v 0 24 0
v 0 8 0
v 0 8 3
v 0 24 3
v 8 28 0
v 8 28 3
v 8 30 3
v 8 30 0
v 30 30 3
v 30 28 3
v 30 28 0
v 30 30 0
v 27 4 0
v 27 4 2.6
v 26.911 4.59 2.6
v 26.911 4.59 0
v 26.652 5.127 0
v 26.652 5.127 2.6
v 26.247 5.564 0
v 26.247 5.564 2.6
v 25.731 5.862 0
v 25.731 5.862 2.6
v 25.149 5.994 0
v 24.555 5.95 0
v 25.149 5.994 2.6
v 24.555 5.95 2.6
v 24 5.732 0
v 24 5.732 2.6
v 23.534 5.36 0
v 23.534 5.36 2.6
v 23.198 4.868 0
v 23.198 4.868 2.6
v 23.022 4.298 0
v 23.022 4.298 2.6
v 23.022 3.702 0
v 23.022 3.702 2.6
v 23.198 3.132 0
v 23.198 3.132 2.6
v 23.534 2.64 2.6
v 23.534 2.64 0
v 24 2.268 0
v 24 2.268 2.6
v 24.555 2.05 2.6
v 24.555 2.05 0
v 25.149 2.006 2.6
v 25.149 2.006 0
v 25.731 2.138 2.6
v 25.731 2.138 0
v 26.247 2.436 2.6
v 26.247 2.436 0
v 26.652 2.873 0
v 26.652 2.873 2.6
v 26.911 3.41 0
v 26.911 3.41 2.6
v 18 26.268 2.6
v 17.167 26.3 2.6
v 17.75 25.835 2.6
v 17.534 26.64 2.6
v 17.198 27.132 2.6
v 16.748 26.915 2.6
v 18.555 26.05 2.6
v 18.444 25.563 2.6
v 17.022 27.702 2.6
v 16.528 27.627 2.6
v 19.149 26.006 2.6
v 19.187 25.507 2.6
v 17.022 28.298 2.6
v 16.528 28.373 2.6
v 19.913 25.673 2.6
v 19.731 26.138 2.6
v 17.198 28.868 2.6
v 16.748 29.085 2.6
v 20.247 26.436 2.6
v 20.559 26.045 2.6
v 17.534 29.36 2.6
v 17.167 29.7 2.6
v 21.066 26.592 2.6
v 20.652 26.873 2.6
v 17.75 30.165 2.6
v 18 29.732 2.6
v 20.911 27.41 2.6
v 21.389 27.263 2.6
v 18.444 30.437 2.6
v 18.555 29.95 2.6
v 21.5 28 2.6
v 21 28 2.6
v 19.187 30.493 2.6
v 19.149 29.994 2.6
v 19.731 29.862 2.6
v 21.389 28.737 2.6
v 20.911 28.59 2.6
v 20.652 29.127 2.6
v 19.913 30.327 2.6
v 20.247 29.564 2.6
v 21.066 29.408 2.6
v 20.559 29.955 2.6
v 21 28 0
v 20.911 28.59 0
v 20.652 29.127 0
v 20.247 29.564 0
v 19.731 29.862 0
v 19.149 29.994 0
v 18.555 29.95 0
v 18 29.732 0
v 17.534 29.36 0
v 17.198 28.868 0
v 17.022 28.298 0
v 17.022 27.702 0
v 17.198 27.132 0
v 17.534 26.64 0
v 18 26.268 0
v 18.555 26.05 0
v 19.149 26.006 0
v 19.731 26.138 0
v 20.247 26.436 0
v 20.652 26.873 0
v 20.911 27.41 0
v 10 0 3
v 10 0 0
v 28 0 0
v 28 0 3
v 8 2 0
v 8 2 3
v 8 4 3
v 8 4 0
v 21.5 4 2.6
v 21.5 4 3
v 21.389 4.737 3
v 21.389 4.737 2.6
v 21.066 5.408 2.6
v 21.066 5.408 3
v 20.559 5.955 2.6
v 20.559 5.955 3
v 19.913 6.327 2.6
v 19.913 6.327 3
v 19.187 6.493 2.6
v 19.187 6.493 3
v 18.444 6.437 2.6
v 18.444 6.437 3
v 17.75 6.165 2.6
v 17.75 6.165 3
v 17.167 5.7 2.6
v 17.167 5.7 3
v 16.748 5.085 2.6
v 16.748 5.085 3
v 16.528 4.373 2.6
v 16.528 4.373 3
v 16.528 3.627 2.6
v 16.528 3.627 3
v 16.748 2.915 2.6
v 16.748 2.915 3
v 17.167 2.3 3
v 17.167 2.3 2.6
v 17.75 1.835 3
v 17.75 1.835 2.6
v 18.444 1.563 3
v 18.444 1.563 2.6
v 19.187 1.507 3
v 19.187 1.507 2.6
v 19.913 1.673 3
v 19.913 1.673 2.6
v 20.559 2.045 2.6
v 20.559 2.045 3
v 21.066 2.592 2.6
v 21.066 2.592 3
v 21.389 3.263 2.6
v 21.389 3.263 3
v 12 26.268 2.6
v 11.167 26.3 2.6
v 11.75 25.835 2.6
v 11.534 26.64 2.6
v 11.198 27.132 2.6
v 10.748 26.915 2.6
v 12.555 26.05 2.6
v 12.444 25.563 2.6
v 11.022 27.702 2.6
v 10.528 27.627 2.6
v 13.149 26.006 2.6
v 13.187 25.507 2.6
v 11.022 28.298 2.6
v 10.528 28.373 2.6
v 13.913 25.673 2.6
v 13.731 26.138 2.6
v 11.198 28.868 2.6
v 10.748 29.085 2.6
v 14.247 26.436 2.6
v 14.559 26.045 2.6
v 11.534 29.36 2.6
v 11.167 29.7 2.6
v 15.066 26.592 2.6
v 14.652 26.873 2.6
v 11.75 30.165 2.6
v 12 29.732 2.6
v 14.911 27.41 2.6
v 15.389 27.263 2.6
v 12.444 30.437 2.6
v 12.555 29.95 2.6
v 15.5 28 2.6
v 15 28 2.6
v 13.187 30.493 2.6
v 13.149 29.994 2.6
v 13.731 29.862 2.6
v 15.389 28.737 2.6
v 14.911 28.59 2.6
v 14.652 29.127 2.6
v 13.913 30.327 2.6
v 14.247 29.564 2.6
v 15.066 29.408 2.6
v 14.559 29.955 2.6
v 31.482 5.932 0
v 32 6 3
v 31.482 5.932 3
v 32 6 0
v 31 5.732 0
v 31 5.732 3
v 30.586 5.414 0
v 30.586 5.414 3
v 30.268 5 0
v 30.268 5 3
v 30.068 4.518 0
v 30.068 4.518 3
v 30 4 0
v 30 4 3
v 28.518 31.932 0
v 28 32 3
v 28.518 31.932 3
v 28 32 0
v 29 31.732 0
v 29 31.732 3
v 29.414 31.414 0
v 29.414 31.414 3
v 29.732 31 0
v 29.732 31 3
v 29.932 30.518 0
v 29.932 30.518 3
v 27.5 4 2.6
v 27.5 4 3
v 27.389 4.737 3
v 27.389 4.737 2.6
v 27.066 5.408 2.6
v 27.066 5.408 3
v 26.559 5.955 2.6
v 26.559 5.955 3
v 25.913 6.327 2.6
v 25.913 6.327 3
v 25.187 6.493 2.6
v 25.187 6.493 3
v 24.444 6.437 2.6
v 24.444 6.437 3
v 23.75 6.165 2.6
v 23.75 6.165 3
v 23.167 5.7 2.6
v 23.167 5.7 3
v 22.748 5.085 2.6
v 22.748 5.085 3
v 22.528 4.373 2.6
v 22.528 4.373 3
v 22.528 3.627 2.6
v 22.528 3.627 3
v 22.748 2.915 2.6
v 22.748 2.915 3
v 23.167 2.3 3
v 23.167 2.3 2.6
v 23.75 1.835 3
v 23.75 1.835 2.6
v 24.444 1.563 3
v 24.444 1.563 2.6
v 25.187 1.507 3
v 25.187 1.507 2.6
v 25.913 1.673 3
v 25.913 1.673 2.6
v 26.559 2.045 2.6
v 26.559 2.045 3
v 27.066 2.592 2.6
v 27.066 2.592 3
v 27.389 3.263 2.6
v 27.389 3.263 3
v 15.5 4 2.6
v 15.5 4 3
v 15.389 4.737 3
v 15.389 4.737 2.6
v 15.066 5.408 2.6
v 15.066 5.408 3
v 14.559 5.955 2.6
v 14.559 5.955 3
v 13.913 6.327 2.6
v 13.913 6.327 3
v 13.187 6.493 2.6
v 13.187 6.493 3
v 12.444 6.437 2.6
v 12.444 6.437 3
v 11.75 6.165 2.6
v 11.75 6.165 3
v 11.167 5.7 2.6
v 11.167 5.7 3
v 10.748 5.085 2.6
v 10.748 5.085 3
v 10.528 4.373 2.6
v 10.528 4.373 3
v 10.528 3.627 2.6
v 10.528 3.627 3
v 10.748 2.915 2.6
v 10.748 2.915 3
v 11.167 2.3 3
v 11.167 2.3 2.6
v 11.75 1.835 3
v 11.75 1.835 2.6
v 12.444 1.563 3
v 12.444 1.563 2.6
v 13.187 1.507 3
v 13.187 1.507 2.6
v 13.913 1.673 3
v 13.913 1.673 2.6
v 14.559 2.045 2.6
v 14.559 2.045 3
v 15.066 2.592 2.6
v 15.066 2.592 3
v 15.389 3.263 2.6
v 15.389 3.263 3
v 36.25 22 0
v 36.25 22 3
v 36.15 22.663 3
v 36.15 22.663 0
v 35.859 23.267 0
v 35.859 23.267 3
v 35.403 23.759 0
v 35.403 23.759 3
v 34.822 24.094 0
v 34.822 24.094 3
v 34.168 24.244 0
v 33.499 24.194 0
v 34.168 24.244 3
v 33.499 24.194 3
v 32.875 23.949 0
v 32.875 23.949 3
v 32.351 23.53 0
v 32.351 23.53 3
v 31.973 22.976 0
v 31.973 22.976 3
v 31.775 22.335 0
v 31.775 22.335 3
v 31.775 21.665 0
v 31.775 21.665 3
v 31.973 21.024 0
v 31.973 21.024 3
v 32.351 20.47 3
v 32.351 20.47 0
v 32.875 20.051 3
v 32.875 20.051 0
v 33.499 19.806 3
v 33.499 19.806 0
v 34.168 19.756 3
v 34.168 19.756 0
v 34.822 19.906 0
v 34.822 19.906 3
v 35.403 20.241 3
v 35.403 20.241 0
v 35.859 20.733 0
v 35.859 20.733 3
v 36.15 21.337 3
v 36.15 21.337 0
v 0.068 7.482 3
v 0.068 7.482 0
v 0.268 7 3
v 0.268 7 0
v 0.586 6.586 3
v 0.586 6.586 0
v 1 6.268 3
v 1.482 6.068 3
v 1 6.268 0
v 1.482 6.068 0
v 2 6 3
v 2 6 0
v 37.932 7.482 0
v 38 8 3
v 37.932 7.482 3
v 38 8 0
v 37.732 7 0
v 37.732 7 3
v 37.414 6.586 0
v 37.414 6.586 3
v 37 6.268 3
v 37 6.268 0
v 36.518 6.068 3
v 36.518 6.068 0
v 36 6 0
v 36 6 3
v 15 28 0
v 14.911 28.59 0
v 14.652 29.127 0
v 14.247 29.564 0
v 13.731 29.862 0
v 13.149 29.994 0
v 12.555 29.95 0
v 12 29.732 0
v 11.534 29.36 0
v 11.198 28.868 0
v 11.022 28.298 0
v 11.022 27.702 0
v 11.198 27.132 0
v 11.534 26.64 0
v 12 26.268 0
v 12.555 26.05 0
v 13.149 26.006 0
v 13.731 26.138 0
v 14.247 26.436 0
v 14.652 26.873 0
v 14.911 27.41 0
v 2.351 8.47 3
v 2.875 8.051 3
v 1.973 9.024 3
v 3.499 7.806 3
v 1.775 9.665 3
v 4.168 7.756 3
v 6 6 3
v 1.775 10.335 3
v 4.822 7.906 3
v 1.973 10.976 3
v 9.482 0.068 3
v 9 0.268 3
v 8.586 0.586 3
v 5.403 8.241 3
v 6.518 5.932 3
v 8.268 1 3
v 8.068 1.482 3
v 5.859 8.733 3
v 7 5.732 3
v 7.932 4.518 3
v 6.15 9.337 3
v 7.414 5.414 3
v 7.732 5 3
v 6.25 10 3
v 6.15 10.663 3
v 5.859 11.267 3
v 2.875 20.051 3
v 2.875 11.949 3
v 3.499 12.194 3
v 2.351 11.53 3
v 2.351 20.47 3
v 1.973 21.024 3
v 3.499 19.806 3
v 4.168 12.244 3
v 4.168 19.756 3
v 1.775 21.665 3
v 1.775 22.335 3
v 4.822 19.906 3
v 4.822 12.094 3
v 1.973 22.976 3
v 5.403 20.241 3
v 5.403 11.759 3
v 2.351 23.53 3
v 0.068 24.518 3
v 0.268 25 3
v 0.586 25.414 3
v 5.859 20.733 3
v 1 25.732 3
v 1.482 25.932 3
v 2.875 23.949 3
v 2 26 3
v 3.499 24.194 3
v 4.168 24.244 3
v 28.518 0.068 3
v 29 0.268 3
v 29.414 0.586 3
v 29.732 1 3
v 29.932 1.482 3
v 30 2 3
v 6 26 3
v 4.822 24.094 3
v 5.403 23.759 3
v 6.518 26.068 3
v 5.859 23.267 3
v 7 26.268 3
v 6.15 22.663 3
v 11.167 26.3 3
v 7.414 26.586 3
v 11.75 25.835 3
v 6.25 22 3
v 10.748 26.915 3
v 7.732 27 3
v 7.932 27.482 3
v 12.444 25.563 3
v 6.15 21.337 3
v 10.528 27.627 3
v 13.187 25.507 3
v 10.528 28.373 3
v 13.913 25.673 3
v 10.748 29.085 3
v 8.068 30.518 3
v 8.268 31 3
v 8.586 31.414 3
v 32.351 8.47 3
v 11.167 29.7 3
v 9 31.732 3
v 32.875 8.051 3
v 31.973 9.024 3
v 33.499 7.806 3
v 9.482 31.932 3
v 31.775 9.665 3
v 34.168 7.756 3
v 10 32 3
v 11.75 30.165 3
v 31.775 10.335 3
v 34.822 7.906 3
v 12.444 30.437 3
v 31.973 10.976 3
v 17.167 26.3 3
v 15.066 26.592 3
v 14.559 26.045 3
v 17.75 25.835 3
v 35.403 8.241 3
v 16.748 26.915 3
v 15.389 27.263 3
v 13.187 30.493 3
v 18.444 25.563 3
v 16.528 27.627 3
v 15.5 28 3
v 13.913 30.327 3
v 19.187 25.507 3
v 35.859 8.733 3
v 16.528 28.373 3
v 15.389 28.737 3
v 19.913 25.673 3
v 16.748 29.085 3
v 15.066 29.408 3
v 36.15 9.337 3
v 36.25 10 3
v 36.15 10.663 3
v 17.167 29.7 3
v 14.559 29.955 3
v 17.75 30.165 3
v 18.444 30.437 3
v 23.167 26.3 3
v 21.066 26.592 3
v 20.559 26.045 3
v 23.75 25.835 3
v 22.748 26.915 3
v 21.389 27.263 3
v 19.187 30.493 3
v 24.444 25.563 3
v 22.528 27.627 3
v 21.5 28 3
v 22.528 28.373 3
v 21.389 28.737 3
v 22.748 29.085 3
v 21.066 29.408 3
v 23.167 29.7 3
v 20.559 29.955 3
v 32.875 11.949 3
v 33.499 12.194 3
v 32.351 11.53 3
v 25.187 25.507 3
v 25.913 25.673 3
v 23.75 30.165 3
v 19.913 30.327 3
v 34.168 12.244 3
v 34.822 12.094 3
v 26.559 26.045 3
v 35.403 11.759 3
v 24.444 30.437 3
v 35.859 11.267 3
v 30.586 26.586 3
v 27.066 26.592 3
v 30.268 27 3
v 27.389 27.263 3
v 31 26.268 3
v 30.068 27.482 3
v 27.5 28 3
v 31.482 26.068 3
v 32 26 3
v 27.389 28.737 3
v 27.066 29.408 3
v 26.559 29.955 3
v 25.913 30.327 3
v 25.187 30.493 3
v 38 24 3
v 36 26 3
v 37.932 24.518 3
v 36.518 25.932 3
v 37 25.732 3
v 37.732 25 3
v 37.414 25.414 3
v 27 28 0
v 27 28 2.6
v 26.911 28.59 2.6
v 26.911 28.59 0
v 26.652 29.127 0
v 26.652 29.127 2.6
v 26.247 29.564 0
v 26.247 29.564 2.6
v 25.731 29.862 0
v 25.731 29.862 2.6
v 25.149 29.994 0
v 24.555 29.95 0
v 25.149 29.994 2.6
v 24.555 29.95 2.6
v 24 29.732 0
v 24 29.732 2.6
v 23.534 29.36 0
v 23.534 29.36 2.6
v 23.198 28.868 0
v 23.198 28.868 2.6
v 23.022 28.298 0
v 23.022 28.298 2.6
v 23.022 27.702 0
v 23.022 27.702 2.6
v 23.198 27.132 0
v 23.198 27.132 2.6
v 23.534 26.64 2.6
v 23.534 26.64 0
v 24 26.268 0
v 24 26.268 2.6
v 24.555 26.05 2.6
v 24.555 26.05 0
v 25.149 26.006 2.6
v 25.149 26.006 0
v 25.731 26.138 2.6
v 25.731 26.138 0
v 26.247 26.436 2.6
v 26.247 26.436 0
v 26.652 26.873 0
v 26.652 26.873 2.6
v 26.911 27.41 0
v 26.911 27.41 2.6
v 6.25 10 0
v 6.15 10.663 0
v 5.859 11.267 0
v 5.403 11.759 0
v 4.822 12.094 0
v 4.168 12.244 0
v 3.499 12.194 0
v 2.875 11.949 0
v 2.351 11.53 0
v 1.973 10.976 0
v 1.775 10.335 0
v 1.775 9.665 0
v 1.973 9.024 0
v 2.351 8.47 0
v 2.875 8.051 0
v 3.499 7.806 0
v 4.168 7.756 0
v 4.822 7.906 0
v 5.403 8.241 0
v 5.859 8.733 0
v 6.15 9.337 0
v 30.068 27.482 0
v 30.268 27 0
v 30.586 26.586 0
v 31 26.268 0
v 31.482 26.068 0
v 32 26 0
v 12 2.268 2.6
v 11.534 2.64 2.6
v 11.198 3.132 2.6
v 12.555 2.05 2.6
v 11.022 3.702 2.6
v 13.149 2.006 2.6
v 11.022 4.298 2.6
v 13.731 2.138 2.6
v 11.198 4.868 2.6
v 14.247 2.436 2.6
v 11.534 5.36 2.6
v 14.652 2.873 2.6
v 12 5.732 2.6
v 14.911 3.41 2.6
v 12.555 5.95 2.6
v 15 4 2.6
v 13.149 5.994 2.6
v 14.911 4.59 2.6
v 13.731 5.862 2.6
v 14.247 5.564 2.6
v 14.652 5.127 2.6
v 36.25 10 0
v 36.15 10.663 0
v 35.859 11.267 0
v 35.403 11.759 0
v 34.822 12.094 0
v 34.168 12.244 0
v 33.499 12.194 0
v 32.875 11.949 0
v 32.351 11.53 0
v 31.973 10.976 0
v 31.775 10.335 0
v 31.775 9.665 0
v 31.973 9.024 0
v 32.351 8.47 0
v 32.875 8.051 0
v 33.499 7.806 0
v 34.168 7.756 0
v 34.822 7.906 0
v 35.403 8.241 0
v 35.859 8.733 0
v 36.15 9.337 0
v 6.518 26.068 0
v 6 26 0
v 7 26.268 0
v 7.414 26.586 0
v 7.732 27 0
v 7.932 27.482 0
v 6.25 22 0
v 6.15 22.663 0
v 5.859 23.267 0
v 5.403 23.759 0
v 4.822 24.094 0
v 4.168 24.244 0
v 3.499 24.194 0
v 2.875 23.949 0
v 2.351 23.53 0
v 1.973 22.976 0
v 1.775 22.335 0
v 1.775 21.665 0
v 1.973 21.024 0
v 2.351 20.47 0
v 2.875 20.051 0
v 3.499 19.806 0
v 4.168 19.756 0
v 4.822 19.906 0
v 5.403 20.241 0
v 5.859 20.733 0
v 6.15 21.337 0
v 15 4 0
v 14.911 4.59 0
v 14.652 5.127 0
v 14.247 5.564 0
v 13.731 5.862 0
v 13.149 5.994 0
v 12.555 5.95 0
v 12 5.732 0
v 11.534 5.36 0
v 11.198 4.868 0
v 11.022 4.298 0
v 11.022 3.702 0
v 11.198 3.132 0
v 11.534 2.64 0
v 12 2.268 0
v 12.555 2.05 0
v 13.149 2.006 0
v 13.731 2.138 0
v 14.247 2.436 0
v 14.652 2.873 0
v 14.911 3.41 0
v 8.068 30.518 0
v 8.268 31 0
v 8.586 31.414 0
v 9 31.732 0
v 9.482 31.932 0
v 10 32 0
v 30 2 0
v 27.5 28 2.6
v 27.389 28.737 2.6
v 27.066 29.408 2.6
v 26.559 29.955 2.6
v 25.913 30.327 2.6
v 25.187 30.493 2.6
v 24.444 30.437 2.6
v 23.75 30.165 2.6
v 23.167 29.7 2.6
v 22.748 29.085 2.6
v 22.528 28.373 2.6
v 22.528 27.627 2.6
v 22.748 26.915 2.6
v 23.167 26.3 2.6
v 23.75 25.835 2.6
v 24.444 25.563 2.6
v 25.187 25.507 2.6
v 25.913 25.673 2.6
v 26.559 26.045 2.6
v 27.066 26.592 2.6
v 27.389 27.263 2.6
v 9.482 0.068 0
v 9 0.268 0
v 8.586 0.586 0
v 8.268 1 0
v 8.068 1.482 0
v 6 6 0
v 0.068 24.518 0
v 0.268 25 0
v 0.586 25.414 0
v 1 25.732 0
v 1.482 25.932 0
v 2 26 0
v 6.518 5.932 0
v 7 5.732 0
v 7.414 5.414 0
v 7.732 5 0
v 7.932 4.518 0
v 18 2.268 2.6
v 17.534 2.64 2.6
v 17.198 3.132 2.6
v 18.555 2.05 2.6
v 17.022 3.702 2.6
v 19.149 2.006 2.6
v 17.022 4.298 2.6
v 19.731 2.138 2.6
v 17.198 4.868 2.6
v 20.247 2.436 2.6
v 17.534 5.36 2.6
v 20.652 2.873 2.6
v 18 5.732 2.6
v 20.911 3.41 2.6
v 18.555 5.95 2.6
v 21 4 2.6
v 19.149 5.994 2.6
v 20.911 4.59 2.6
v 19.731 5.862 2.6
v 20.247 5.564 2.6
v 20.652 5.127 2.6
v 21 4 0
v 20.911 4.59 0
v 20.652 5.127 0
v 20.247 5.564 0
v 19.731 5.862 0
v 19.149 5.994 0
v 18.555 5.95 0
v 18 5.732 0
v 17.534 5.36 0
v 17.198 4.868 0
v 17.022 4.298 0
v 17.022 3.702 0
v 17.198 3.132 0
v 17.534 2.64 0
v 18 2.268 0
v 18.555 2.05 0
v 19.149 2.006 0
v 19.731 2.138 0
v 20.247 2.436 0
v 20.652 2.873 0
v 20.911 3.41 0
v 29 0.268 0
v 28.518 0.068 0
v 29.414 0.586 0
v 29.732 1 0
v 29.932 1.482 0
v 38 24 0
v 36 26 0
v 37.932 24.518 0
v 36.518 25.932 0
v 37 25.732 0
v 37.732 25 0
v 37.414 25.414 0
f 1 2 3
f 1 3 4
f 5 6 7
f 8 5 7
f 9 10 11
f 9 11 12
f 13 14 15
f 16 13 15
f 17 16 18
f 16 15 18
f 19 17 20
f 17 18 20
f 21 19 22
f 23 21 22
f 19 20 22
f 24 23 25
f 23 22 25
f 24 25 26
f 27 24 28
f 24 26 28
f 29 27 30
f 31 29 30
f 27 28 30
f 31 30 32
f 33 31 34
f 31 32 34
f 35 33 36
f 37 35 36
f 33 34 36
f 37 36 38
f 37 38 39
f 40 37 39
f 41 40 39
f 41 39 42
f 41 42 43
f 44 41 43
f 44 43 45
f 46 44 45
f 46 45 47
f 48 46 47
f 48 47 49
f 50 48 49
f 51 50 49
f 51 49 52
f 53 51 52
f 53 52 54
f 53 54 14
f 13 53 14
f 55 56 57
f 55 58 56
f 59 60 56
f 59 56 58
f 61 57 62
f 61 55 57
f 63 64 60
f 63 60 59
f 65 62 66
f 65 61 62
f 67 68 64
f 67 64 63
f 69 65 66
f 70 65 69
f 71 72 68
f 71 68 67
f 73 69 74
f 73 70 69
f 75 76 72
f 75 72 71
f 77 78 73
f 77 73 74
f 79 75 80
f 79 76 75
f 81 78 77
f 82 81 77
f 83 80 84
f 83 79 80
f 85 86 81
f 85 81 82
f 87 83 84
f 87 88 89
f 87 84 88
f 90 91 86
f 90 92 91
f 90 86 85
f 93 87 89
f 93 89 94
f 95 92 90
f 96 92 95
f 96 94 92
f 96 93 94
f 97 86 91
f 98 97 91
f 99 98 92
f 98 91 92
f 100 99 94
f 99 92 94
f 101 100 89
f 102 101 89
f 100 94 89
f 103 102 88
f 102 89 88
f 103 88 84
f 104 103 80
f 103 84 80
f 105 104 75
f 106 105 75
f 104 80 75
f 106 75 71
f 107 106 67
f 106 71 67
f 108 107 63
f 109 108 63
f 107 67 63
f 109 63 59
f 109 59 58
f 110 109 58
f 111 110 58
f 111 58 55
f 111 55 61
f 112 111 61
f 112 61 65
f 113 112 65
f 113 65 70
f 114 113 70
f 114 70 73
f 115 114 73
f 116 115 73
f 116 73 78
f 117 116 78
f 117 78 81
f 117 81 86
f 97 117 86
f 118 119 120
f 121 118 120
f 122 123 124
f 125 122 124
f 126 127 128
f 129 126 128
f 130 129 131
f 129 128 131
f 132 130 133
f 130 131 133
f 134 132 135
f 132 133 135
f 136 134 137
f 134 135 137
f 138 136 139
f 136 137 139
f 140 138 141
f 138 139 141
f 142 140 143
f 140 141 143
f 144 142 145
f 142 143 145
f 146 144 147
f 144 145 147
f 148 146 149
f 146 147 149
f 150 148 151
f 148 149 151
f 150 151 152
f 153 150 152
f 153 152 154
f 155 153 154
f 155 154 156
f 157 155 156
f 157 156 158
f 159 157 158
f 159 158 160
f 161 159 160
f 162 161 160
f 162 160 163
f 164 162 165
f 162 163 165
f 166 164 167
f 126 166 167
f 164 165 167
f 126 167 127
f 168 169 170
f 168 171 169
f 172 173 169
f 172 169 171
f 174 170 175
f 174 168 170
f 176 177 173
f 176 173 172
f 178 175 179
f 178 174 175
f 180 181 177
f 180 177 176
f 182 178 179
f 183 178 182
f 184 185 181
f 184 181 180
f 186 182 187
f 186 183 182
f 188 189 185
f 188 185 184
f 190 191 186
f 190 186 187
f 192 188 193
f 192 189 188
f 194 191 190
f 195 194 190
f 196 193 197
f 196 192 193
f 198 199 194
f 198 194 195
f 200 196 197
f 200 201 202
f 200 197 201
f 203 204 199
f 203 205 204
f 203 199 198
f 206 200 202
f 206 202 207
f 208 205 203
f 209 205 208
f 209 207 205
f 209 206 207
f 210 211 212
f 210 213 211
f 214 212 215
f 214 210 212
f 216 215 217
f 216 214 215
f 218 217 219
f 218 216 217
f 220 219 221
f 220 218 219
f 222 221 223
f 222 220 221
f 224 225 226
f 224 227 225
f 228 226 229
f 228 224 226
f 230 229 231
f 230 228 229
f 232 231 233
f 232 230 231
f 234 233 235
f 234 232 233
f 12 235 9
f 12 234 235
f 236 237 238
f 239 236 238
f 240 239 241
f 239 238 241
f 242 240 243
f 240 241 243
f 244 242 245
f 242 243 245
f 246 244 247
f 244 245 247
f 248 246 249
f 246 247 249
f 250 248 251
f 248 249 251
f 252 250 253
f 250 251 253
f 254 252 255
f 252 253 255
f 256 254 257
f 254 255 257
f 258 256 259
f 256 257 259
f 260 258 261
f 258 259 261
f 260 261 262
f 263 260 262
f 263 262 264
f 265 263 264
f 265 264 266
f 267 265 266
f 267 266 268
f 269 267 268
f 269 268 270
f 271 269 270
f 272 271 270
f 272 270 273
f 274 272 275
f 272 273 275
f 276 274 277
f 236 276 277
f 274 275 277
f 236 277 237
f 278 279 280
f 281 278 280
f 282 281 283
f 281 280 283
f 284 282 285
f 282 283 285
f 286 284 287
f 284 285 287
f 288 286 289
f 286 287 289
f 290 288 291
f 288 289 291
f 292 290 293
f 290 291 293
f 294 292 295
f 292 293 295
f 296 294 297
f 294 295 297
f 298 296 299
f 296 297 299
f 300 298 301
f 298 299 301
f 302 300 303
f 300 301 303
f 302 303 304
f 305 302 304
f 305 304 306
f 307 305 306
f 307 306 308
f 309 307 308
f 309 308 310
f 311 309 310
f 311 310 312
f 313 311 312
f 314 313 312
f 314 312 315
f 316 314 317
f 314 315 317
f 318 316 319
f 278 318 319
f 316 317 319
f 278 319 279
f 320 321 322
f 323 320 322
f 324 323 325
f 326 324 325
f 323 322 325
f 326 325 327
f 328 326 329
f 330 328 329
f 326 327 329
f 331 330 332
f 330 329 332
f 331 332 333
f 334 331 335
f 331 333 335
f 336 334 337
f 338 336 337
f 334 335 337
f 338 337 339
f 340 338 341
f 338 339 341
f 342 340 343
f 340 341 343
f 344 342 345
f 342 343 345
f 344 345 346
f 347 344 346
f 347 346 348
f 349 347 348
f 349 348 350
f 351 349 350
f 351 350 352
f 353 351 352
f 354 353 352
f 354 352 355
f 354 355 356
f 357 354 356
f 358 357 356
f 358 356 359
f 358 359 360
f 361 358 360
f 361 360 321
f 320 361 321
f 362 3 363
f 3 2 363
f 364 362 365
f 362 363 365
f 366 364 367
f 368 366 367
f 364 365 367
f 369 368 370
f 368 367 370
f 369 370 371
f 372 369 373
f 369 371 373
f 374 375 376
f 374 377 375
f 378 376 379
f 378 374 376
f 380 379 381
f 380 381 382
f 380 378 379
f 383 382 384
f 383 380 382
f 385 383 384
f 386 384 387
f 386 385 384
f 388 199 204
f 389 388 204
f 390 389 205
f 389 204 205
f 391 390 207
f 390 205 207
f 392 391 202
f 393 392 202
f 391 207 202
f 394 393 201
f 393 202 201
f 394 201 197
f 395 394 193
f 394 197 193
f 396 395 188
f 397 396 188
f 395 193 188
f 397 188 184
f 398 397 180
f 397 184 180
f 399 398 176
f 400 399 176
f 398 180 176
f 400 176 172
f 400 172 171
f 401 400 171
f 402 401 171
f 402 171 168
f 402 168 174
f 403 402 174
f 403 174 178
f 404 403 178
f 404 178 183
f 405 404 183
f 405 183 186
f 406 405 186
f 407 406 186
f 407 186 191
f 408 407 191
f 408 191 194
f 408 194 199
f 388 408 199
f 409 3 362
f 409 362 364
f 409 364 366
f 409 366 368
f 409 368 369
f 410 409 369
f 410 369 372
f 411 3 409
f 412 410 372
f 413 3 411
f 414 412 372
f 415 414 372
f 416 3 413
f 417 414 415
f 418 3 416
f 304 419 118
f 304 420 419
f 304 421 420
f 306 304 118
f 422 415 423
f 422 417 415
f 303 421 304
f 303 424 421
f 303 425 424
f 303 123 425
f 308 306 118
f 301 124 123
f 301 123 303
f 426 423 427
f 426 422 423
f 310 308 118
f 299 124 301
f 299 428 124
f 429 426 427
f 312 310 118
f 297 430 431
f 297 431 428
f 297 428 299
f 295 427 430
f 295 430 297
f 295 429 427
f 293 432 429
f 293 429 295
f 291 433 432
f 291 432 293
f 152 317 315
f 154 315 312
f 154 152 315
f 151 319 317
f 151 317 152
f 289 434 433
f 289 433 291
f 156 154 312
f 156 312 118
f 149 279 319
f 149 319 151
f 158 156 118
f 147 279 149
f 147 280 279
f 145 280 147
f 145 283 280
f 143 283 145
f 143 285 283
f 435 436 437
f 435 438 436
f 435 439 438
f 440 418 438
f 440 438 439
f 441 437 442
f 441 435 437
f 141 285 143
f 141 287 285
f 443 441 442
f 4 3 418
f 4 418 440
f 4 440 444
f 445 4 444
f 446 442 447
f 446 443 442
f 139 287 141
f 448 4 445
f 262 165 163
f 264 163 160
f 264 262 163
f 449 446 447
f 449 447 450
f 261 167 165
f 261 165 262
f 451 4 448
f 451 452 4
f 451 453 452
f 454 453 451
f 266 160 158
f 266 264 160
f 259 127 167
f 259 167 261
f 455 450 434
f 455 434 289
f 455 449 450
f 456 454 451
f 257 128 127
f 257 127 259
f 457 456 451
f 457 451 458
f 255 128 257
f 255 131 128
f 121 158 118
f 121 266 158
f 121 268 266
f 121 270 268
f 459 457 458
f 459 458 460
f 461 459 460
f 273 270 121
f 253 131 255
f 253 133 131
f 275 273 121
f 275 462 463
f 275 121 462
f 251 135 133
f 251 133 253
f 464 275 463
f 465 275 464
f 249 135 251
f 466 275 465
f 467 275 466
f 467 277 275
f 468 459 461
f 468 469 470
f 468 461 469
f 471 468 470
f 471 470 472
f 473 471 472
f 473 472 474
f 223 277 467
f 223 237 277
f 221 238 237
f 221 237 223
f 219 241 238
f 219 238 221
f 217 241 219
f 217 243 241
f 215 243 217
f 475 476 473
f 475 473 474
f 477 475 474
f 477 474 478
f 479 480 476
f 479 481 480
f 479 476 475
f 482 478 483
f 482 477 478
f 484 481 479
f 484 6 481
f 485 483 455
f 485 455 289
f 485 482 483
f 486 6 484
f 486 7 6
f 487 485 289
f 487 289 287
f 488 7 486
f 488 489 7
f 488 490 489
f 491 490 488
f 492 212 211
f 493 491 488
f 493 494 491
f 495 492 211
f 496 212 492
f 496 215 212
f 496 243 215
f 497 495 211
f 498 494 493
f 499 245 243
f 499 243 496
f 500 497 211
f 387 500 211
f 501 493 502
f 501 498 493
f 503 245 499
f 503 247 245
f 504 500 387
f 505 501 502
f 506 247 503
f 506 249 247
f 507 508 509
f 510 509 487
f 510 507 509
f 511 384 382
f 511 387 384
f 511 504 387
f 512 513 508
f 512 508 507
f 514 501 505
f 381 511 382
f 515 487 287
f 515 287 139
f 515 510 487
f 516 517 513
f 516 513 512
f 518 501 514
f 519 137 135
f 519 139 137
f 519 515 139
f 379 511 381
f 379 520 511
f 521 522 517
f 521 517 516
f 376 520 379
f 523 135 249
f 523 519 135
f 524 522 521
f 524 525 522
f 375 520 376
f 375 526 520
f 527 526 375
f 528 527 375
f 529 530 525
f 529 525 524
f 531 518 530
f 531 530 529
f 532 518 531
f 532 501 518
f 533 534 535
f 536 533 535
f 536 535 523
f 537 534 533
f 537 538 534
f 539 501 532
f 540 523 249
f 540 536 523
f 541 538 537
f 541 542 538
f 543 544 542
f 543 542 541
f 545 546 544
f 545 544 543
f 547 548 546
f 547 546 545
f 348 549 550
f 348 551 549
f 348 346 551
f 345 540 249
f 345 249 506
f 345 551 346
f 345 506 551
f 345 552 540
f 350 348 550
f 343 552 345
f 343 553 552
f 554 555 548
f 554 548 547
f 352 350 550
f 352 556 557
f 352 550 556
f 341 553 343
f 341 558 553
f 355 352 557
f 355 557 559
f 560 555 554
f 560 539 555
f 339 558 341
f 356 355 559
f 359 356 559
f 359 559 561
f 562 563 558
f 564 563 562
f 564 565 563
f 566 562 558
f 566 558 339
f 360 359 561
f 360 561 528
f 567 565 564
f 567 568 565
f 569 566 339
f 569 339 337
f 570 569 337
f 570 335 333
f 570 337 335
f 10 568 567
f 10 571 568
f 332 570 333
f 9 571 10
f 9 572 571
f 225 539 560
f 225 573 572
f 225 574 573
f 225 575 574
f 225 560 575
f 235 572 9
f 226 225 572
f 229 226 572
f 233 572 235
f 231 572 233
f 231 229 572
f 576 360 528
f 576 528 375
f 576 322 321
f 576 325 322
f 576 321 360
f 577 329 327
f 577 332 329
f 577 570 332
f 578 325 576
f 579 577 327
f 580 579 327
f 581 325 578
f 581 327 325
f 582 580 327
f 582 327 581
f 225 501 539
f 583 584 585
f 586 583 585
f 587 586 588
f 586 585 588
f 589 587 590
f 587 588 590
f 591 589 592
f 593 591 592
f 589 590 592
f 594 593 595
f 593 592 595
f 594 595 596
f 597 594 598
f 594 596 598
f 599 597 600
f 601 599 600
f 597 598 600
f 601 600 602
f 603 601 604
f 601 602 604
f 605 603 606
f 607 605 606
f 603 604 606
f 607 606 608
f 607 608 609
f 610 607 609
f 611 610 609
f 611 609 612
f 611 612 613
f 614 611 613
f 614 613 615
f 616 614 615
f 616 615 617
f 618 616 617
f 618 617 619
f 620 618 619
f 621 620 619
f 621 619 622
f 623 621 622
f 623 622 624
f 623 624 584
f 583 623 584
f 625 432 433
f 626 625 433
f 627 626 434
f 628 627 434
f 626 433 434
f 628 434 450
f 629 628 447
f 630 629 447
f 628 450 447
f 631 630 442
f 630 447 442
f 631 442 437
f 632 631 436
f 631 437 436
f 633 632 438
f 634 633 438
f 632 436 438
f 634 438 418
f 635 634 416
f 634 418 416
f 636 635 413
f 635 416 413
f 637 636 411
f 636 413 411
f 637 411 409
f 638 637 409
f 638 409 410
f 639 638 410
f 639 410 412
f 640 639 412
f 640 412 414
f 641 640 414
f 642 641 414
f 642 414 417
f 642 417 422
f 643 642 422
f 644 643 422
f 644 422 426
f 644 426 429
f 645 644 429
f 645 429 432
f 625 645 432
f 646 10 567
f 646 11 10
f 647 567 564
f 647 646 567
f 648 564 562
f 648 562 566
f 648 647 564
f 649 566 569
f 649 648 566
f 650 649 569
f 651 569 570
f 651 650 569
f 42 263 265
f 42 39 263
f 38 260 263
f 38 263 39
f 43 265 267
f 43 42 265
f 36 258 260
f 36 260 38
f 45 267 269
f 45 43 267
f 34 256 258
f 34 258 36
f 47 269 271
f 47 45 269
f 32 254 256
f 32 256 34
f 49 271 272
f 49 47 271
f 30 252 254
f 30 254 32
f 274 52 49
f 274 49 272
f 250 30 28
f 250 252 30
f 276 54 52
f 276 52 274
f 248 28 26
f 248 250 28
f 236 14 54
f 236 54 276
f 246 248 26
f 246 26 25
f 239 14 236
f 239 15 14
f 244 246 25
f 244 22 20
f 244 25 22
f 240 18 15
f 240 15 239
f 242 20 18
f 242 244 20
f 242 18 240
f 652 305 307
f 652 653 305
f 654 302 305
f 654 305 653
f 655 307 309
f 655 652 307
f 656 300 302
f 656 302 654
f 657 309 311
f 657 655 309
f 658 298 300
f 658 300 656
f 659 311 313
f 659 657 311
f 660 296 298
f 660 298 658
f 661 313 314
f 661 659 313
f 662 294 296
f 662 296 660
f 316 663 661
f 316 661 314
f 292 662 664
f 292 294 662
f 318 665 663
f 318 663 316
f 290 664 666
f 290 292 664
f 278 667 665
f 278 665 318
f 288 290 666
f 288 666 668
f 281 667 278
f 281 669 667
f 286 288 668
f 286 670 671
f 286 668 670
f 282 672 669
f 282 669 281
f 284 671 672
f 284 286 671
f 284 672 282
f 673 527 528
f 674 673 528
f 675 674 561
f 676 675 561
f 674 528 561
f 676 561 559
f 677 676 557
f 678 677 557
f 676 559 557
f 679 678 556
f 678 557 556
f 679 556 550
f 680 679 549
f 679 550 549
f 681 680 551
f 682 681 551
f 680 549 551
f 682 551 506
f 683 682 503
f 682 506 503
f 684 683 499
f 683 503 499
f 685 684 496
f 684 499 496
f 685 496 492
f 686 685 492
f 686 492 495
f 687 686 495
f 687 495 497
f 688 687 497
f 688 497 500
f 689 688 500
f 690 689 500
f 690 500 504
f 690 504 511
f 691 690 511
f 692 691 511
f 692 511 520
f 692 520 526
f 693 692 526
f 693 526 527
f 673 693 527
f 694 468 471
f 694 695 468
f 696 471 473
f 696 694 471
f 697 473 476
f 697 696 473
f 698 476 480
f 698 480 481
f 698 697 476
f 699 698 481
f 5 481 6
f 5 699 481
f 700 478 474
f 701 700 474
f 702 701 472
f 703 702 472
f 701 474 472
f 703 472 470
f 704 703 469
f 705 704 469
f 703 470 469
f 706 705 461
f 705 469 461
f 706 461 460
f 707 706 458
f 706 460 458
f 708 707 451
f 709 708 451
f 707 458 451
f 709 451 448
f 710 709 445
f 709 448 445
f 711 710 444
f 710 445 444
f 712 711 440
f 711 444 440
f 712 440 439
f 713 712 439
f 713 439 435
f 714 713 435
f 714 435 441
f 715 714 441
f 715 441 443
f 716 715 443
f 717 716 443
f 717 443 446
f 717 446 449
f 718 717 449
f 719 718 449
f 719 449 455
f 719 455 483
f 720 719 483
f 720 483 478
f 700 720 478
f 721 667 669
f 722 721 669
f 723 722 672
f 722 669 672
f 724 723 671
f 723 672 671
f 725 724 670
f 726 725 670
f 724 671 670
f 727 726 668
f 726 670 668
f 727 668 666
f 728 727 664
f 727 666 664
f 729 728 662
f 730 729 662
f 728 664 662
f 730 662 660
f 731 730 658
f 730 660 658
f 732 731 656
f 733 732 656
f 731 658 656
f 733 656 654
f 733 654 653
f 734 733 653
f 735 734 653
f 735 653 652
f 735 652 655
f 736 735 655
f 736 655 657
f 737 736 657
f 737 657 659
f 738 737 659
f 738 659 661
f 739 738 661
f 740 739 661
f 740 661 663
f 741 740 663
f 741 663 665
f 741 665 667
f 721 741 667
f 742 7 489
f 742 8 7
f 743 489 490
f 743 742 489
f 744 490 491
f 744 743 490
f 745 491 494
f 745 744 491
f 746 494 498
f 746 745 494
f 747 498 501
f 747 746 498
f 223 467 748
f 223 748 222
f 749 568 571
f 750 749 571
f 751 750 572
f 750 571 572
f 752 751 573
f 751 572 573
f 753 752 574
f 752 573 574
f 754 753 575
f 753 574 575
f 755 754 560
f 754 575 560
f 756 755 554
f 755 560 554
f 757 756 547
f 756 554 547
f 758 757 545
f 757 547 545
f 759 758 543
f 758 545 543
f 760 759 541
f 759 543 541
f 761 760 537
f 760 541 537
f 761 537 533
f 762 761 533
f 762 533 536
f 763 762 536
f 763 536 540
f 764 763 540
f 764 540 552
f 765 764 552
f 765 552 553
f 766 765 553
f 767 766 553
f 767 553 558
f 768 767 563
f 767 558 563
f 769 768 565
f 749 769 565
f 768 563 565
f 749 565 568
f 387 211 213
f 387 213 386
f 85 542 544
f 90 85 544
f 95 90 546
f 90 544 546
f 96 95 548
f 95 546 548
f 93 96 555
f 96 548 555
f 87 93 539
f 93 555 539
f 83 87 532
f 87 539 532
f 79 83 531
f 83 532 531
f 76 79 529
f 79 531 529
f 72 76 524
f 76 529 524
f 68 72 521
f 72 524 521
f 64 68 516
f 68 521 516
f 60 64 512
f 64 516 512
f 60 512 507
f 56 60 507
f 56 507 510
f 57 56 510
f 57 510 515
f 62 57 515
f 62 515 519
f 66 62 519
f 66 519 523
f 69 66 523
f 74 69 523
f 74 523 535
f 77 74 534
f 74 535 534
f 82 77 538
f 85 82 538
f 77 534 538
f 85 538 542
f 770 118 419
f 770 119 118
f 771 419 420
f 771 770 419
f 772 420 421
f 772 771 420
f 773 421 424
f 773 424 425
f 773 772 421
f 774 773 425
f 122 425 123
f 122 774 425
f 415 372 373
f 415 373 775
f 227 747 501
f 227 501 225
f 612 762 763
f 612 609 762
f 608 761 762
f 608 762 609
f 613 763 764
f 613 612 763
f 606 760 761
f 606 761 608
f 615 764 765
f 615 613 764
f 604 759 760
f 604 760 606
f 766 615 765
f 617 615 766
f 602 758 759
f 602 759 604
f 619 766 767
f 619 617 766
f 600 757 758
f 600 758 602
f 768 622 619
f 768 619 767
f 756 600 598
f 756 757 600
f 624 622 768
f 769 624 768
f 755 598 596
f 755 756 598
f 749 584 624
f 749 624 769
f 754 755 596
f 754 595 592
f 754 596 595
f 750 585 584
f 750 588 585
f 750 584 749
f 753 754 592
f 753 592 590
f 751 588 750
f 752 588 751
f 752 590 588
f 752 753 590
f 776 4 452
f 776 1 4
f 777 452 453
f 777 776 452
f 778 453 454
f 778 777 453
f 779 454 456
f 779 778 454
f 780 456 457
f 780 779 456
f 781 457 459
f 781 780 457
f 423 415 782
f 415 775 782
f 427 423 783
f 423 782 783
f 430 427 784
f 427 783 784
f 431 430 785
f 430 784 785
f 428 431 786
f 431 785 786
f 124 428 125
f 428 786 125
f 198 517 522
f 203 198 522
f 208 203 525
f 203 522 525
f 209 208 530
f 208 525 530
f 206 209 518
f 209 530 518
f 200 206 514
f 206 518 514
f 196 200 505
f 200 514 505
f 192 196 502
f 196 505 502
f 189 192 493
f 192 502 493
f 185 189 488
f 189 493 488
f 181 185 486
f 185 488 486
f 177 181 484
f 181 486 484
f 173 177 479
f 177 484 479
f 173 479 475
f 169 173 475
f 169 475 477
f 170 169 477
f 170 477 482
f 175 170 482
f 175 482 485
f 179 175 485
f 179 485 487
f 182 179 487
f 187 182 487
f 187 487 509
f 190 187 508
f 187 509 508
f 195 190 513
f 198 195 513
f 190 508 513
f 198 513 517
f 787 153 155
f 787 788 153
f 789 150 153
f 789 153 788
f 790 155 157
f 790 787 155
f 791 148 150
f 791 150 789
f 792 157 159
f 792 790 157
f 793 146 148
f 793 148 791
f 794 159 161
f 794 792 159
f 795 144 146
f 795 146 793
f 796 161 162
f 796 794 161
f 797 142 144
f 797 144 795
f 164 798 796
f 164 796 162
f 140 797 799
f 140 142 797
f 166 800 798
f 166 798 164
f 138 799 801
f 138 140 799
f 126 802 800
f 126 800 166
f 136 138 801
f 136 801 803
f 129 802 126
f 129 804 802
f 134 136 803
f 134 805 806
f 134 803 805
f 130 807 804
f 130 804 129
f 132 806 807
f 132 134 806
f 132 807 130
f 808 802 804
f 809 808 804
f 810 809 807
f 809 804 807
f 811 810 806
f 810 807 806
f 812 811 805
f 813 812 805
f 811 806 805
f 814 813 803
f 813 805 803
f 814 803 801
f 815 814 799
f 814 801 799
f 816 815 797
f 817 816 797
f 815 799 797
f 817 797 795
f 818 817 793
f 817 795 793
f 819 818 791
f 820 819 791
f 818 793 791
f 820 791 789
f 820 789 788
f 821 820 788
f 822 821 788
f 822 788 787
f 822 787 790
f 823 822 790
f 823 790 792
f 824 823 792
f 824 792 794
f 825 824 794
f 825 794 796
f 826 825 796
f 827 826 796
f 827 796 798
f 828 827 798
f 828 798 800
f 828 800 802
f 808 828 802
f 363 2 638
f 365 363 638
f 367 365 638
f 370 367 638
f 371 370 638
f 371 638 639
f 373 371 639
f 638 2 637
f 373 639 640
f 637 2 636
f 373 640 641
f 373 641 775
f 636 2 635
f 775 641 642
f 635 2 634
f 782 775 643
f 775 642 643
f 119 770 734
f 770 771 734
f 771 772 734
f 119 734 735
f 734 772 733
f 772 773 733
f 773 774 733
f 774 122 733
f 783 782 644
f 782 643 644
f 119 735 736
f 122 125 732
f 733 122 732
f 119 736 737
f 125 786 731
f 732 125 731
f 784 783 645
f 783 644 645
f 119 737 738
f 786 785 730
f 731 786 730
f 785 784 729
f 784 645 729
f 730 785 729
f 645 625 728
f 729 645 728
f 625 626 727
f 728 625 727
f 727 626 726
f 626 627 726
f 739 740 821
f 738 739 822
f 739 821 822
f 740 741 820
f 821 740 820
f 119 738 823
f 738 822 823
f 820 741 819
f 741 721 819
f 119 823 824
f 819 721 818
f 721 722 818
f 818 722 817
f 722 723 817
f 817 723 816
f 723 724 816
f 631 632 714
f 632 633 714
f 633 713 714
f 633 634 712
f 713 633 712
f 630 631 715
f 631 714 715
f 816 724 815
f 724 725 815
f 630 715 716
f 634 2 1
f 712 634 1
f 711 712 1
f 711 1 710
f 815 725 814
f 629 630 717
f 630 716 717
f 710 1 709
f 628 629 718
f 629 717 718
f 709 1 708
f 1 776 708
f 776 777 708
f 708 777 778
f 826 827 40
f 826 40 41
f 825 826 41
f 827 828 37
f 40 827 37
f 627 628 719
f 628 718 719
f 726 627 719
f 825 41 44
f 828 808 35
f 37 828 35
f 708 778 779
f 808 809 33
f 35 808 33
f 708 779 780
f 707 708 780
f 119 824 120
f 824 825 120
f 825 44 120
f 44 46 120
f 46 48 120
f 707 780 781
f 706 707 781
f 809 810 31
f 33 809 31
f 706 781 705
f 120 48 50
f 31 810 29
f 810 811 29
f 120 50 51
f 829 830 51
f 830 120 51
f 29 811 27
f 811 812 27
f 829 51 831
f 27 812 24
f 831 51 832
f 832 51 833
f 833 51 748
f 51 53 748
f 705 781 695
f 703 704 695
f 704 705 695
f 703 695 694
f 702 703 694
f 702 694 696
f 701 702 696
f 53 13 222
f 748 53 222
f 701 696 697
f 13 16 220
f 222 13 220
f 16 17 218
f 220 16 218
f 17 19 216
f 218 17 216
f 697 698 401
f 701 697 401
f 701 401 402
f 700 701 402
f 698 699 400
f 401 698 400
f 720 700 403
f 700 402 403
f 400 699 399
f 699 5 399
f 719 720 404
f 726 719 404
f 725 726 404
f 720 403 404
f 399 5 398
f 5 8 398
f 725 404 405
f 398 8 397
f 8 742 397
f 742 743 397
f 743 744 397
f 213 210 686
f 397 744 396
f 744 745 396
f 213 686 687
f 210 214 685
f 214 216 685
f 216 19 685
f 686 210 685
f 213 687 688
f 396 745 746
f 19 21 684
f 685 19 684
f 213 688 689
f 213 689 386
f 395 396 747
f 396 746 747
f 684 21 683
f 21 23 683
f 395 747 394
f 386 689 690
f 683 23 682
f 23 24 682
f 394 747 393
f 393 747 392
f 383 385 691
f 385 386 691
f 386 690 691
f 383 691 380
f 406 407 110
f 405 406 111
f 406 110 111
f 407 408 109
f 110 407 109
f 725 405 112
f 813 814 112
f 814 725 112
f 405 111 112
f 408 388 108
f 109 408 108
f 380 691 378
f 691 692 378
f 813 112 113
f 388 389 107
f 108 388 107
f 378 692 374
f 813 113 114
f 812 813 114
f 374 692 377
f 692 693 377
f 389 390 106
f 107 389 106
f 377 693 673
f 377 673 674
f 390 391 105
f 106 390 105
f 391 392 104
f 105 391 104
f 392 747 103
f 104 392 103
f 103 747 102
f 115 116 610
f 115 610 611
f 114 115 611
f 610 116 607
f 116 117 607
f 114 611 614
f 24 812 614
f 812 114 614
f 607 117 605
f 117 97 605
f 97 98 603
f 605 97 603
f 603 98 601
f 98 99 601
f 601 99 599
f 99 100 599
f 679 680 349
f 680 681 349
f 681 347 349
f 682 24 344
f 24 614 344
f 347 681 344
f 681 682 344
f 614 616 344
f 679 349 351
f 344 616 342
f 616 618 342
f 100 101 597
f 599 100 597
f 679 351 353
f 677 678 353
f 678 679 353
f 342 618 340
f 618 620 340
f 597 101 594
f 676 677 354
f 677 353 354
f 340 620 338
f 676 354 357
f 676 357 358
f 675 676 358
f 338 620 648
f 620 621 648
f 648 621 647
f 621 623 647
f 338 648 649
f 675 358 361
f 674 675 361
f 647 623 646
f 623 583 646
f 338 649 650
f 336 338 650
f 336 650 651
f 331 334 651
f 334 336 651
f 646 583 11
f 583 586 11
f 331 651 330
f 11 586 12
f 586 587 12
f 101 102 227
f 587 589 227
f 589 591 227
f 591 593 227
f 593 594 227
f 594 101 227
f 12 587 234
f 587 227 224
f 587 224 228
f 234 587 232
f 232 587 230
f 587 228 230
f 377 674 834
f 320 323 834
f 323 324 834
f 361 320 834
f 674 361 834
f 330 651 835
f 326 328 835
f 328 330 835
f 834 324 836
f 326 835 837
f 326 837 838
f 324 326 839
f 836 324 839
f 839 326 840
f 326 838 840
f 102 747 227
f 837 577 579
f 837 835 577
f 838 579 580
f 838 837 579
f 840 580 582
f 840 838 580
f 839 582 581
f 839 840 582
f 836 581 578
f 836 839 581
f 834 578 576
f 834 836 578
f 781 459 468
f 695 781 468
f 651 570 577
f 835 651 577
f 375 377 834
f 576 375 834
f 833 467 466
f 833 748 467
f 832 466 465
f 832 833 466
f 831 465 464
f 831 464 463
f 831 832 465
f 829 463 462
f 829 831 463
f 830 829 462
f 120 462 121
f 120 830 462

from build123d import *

# Parameters (mm, degrees)
ESQUISSE2_W                  = 38
ESQUISSE2_H                  = 32
BOSS_EXTRU_1_DEPTH           = 3
ESQUISSE3_R                  = 2
ESQUISSE3_R_2                = 2.25
ENL_V_MAT_EXTRU_1_DEPTH      = 1
ENL_V_MAT_EXTRU_1_DEPTH_BACK = 4
ESQUISSE4_R                  = 2.5
ENL_V_MAT_EXTRU_2_DEPTH      = 0.4
ESQUISSE5_W                  = 8
ESQUISSE5_H                  = 6
ENL_V_MAT_EXTRU_3_DEPTH      = 1
ENL_V_MAT_EXTRU_3_DEPTH_BACK = 4
CONG_1_R                     = 2


with BuildPart() as part:
    # Esquisse2 → Boss.-Extru.1 (new body)
    with BuildSketch(Plane.XY):
        with Locations((19, 16)):
            Rectangle(ESQUISSE2_W, ESQUISSE2_H)
    extrude(amount=BOSS_EXTRU_1_DEPTH)

    # Esquisse3 → Enlèv. mat.-Extru.1 (cut, two sides)
    with BuildSketch(Plane.XY.offset(3)) as enl_v_mat_extru_1_sk:
        with Locations((19, 28)):
            Circle(ESQUISSE3_R)
        with Locations((13, 28)):
            Circle(ESQUISSE3_R)
        with Locations((25, 28)):
            Circle(ESQUISSE3_R)
        with Locations((25, 4)):
            Circle(ESQUISSE3_R)
        with Locations((13, 4)):
            Circle(ESQUISSE3_R)
        with Locations((19, 4)):
            Circle(ESQUISSE3_R)
        with Locations((4, 22)):
            Circle(ESQUISSE3_R_2)
        with Locations((4, 10)):
            Circle(ESQUISSE3_R_2)
        with Locations((34, 10)):
            Circle(ESQUISSE3_R_2)
        with Locations((34, 22)):
            Circle(ESQUISSE3_R_2)
    extrude(amount=ENL_V_MAT_EXTRU_1_DEPTH, mode=Mode.SUBTRACT)
    extrude(enl_v_mat_extru_1_sk.sketch, amount=-ENL_V_MAT_EXTRU_1_DEPTH_BACK, mode=Mode.SUBTRACT)

    # Esquisse4 → Enlèv. mat.-Extru.2 (cut)
    with BuildSketch(Plane.XY.offset(3)):
        with Locations((13, 4)):
            Circle(ESQUISSE4_R)
        with Locations((19, 4)):
            Circle(ESQUISSE4_R)
        with Locations((25, 4)):
            Circle(ESQUISSE4_R)
        with Locations((25, 28)):
            Circle(ESQUISSE4_R)
        with Locations((19, 28)):
            Circle(ESQUISSE4_R)
        with Locations((13, 28)):
            Circle(ESQUISSE4_R)
    extrude(amount=-ENL_V_MAT_EXTRU_2_DEPTH, mode=Mode.SUBTRACT)

    # Esquisse5 → Enlèv. mat.-Extru.3 (cut, two sides)
    with BuildSketch(Plane.XY.offset(3)) as enl_v_mat_extru_3_sk:
        with Locations((4, 29)):
            Rectangle(ESQUISSE5_W, ESQUISSE5_H)
        with Locations((34, 29)):
            Rectangle(ESQUISSE5_W, ESQUISSE5_H)
        with Locations((34, 3)):
            Rectangle(ESQUISSE5_W, ESQUISSE5_H)
        with Locations((4, 3)):
            Rectangle(ESQUISSE5_W, ESQUISSE5_H)
    extrude(amount=ENL_V_MAT_EXTRU_3_DEPTH, mode=Mode.SUBTRACT)
    extrude(enl_v_mat_extru_3_sk.sketch, amount=-ENL_V_MAT_EXTRU_3_DEPTH_BACK, mode=Mode.SUBTRACT)

    # Congé1
    cong_1_edges = [part.edges().sort_by_distance(p)[0] for p in [
        (0, 26, 1.5),
        (8, 32, 1.5),
        (8, 26, 1.5),
        (30, 32, 1.5),
        (38, 26, 1.5),
        (30, 26, 1.5),
        (38, 6, 1.5),
        (30, 0, 1.5),
        (30, 6, 1.5),
        (8, 0, 1.5),
        (0, 6, 1.5),
        (8, 6, 1.5),
    ]]
    fillet(cong_1_edges, radius=CONG_1_R)


solid = part.part
